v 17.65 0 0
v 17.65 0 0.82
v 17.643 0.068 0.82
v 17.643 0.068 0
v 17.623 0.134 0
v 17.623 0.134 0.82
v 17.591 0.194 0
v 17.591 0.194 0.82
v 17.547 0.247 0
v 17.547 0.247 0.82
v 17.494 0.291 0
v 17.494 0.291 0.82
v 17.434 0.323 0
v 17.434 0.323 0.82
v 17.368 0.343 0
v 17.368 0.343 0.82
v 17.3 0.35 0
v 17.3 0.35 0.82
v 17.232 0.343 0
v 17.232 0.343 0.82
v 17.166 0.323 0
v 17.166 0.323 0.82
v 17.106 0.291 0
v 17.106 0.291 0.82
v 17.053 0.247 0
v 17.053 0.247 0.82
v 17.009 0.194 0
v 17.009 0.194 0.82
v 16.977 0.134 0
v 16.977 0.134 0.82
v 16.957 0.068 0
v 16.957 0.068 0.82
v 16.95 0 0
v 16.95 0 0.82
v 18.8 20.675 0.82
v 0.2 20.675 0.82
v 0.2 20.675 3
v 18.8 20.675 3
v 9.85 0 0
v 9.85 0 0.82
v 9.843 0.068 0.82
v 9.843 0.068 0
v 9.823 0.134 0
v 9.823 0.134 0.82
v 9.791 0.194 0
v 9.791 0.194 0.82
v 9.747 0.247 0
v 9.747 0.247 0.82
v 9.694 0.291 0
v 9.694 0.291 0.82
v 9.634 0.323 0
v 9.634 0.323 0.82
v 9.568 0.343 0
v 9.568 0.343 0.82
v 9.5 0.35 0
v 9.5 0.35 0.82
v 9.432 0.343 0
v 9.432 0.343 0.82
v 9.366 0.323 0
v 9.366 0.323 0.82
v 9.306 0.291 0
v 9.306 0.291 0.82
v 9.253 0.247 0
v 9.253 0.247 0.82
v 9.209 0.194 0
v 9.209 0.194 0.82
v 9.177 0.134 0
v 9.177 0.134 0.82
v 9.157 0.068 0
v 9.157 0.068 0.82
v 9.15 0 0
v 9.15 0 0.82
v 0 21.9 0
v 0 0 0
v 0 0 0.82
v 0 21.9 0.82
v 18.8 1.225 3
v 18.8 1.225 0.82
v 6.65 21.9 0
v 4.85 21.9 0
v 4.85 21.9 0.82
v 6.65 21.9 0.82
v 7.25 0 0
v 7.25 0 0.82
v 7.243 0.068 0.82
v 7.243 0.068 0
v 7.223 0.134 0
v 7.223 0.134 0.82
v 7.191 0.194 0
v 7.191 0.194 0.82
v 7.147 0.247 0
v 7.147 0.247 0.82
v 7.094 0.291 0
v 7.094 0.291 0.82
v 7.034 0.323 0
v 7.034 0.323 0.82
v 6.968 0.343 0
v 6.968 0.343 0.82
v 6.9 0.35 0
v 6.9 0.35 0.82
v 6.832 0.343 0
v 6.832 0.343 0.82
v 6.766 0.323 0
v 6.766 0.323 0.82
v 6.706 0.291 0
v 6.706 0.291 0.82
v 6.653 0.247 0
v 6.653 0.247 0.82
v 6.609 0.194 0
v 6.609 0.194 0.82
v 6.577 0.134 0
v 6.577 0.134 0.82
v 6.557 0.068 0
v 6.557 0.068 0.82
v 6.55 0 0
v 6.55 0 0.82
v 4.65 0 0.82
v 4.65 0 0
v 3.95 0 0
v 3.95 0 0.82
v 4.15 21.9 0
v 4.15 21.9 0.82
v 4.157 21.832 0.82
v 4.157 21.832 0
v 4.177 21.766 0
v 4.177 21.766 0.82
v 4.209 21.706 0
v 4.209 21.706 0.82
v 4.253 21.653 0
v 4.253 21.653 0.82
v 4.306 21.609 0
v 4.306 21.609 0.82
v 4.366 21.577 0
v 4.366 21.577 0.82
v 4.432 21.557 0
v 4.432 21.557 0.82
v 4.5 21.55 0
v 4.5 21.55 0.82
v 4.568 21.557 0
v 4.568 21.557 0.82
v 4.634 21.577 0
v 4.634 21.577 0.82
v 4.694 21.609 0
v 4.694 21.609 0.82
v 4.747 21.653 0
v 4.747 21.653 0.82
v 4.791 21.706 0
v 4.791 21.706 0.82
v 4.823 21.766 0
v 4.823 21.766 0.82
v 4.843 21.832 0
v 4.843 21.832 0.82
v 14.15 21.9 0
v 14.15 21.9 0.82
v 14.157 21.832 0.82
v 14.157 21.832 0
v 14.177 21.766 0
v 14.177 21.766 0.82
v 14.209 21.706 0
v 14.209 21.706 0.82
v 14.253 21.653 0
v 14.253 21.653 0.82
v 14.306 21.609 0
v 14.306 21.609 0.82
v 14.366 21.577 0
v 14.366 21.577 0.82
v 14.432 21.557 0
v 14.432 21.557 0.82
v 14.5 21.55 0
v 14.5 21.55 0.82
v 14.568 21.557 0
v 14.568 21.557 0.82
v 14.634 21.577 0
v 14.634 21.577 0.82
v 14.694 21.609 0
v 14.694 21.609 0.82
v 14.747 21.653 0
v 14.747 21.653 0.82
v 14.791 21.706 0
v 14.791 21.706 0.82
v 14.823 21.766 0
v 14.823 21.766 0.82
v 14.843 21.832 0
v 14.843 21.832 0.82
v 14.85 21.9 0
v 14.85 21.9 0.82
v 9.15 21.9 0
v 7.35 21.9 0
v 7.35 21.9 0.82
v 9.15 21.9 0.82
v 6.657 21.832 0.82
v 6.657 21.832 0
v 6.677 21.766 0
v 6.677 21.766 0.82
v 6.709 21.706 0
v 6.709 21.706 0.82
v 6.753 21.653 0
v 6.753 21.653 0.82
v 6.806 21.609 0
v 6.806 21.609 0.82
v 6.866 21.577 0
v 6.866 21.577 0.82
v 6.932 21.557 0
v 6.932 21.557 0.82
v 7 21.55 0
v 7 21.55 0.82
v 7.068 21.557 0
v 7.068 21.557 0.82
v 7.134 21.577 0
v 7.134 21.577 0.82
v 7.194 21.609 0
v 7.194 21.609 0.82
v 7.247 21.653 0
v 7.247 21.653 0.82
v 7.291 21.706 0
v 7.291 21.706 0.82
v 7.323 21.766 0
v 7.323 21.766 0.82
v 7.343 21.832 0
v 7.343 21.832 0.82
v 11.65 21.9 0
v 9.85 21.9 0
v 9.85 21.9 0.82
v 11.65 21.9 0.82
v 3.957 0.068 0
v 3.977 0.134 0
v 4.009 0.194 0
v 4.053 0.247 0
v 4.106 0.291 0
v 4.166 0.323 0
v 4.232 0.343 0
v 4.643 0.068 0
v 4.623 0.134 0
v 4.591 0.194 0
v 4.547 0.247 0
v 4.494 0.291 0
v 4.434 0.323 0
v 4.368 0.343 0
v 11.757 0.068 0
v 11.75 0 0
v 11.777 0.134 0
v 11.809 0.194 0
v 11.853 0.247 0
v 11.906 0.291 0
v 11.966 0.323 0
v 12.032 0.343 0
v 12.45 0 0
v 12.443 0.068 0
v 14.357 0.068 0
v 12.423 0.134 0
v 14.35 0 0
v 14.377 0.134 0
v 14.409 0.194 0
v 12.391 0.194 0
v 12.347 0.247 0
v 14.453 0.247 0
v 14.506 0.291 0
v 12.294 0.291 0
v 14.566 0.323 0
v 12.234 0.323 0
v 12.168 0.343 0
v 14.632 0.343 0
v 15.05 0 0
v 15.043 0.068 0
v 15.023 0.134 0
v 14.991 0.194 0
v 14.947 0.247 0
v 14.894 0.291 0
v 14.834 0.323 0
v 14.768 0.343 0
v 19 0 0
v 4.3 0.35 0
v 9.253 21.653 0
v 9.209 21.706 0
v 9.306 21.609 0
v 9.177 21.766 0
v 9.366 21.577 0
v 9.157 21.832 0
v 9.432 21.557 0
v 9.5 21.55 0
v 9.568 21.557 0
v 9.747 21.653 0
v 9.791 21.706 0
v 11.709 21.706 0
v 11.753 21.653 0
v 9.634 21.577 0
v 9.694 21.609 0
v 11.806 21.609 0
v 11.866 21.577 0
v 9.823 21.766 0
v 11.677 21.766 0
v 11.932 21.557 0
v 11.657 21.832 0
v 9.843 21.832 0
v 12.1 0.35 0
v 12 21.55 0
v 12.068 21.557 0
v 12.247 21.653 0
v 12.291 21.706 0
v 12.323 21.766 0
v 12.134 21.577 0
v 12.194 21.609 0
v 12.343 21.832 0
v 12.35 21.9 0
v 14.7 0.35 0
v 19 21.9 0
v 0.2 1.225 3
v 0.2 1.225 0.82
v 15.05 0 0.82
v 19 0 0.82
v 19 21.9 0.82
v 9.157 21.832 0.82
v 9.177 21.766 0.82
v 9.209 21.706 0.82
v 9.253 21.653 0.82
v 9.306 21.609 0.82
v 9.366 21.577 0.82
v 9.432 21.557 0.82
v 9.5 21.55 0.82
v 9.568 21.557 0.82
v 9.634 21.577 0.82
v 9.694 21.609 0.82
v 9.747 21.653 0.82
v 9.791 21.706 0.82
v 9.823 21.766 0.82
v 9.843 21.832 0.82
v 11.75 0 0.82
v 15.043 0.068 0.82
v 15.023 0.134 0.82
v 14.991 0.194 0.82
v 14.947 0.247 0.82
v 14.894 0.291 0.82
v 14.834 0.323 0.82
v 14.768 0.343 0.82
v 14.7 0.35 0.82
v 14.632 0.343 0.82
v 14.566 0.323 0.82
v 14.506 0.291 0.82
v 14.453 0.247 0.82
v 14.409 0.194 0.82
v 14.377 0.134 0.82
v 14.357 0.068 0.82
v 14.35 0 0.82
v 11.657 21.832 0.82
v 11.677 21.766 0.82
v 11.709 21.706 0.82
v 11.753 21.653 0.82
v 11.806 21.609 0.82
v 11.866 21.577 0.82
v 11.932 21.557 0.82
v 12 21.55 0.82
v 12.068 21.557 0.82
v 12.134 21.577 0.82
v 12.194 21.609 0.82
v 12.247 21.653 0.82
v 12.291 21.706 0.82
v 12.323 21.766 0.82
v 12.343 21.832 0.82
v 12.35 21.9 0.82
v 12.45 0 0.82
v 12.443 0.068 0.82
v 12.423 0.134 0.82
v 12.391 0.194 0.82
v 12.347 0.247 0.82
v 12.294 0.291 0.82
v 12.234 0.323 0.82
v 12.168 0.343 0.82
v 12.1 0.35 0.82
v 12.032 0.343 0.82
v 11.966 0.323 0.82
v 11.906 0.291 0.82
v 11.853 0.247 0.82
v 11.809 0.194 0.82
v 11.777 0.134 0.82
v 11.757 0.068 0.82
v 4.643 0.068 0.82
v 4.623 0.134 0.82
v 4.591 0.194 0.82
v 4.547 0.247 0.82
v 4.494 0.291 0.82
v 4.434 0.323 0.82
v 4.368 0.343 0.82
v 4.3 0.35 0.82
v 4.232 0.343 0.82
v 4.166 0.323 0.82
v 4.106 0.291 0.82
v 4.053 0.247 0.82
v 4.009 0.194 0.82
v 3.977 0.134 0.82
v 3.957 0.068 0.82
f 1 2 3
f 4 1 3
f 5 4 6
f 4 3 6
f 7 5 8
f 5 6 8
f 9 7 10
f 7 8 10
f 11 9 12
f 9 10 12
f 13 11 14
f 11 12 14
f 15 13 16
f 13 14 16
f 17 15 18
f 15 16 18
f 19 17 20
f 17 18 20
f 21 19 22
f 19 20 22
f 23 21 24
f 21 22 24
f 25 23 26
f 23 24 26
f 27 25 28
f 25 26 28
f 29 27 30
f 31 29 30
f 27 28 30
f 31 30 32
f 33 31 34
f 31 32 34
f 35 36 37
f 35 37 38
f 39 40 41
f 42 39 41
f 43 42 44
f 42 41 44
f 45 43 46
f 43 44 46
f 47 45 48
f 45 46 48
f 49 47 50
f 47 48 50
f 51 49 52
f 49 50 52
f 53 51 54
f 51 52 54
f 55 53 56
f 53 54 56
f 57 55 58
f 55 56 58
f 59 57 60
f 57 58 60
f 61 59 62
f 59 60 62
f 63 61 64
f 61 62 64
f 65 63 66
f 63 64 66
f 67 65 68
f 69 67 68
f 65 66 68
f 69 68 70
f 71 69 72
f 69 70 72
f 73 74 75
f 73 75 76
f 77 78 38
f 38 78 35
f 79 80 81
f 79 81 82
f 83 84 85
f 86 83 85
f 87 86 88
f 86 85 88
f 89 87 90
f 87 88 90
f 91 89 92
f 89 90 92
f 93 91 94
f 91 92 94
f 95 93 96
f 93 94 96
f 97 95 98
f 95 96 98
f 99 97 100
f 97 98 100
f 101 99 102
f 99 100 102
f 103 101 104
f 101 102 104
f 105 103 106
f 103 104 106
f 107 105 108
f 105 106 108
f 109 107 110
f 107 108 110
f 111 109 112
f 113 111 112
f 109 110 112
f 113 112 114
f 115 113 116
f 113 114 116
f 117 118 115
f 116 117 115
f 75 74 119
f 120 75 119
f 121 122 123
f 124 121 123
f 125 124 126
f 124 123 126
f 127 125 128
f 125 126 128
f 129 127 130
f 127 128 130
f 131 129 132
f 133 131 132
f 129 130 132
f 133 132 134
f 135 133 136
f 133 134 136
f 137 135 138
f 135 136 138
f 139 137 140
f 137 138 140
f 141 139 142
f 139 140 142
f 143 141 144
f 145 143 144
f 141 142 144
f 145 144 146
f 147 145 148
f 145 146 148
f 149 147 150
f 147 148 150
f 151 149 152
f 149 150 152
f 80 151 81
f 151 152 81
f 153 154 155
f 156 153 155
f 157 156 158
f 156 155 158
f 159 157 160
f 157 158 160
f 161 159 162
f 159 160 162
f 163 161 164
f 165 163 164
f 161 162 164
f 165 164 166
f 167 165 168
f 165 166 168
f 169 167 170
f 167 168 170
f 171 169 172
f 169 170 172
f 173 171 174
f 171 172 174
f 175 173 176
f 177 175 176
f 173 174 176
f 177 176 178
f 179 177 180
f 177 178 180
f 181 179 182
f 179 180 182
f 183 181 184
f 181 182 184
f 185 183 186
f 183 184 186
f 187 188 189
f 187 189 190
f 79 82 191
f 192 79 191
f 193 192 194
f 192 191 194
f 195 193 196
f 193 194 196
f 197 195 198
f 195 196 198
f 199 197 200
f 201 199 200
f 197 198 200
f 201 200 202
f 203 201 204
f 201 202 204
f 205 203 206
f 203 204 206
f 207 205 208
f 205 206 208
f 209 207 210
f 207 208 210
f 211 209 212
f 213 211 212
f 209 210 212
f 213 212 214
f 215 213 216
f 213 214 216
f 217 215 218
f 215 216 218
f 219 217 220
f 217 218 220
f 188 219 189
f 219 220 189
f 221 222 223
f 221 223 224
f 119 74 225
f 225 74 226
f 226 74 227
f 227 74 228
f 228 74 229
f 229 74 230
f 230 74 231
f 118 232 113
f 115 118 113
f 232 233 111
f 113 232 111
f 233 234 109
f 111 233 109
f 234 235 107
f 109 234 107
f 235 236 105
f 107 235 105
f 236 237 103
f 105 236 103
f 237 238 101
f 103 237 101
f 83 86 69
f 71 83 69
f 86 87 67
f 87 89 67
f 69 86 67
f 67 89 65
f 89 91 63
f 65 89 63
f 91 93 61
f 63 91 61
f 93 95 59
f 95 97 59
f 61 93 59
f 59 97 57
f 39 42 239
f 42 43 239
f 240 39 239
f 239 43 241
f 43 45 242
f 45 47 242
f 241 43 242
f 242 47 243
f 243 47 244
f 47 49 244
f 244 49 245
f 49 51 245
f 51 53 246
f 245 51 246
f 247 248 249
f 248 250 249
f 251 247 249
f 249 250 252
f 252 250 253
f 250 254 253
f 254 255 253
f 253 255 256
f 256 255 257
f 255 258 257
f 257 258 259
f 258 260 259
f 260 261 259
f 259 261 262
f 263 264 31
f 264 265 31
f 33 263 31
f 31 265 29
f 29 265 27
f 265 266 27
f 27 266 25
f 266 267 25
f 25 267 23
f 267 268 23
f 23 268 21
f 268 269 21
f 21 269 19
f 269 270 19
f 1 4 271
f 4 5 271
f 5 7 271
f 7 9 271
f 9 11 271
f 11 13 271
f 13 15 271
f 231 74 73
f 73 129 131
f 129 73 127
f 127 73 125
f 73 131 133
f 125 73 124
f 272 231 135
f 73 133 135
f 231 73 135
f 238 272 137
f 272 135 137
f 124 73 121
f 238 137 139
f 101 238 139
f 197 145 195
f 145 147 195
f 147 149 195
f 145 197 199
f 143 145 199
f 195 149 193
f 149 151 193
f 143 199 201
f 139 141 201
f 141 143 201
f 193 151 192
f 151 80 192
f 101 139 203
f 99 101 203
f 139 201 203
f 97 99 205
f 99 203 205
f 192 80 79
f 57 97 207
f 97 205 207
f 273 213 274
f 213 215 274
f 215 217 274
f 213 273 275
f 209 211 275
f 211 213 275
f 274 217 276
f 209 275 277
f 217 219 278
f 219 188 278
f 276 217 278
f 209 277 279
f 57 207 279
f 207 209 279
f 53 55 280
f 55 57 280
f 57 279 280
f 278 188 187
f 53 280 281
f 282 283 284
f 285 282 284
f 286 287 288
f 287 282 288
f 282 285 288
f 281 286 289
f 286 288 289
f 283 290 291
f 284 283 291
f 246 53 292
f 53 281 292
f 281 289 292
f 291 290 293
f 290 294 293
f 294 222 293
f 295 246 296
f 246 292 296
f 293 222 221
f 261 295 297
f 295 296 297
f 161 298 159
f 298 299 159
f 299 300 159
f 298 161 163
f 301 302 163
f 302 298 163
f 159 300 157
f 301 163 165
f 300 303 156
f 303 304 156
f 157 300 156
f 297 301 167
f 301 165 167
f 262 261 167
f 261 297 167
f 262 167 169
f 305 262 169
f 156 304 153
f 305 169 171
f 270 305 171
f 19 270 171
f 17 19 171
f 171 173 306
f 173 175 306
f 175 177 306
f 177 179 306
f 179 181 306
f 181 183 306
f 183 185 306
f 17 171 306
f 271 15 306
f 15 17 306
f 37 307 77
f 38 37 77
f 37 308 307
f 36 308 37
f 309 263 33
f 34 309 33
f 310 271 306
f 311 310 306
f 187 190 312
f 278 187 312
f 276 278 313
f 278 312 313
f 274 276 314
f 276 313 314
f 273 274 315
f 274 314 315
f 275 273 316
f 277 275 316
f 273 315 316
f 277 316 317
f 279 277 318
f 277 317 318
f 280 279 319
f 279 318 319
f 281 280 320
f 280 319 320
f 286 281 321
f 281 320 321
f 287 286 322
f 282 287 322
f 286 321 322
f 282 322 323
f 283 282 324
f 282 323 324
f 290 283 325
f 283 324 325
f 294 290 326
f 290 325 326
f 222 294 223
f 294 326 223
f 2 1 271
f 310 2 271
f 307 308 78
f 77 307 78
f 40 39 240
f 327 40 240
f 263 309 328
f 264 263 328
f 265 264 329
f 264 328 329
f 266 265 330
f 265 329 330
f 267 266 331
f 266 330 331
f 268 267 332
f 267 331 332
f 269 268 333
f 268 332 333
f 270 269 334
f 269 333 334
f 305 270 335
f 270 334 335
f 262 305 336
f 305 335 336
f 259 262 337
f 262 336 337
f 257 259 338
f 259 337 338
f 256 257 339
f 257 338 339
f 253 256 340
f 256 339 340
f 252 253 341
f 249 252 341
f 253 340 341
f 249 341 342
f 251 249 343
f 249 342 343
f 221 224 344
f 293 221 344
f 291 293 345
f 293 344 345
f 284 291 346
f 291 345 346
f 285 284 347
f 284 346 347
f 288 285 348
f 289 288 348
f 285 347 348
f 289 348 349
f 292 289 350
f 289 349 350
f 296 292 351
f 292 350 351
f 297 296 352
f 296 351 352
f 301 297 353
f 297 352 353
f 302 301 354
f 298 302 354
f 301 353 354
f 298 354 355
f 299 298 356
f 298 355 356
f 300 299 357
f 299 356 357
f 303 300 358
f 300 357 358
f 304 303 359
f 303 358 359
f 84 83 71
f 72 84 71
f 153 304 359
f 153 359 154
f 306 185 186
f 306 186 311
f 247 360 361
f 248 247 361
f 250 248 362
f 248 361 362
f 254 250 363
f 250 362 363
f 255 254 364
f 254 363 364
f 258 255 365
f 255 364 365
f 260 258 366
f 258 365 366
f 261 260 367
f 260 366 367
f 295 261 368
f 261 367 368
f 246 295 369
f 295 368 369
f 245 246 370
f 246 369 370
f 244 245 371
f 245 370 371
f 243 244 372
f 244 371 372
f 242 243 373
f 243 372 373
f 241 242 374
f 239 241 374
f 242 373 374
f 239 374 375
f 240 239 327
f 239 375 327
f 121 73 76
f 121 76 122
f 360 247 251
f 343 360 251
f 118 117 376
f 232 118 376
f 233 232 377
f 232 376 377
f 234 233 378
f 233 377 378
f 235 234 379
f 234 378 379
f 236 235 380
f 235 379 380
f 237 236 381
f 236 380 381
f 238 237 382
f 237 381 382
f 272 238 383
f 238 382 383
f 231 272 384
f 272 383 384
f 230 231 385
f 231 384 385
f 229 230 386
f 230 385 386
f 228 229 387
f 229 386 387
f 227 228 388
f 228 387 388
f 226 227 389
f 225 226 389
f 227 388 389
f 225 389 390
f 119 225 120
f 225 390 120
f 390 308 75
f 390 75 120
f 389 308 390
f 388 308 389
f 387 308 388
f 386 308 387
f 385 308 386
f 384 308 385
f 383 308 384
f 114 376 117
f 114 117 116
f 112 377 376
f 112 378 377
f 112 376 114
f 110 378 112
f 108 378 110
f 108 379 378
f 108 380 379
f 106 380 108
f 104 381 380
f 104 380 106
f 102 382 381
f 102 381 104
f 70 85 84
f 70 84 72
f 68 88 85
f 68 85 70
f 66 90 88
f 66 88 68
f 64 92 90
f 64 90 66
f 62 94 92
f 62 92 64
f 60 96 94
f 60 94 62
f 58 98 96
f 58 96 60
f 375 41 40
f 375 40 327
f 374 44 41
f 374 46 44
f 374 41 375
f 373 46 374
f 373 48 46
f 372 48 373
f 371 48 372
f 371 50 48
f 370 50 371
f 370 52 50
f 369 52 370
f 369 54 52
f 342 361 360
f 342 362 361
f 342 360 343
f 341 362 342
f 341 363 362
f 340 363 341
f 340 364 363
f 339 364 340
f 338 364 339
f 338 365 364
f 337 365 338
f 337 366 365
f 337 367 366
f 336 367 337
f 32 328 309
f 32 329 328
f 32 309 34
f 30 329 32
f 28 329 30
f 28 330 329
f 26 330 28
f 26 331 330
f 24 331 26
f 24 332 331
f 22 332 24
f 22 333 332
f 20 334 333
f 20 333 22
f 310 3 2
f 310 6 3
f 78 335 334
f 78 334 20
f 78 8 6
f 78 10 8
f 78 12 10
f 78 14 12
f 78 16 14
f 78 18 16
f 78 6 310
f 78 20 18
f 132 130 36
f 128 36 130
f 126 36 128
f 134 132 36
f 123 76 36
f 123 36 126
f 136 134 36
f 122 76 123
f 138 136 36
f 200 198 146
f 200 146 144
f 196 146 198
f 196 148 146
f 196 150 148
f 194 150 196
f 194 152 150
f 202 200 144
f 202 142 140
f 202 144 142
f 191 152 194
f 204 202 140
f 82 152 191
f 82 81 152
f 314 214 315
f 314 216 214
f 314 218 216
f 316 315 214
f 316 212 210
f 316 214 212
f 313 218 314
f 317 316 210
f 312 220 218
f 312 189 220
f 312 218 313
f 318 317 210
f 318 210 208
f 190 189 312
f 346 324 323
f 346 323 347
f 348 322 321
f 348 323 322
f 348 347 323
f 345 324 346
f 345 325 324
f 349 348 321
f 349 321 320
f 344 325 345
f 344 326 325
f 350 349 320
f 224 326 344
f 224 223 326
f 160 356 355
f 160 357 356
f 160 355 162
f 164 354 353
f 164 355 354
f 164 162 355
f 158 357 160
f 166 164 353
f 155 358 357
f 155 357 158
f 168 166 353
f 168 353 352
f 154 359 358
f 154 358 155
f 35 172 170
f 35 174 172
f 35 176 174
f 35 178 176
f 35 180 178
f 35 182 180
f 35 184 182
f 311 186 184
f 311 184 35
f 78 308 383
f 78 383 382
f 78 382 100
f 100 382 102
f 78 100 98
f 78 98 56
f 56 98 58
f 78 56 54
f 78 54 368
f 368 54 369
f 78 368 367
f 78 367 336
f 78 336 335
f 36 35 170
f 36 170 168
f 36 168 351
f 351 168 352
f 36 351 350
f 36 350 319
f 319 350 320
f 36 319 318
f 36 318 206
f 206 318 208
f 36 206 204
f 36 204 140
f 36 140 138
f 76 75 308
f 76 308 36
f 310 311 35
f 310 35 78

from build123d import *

# Parameters (mm, degrees)
SKETCH1_W           = 19
SKETCH1_H           = 21.9
BOSS_EXTRUDE1_DEPTH = 0.82
SKETCH2_W           = 18.6
SKETCH2_H           = 19.45
BOSS_EXTRUDE2_DEPTH = 2.18
SKETCH3_R           = 0.35
CUT_EXTRUDE1_DEPTH  = 30.075116509


with BuildPart() as part:
    # Sketch1 → Boss-Extrude1 (new body)
    with BuildSketch(Plane.XY):
        with Locations((9.5, 10.95)):
            Rectangle(SKETCH1_W, SKETCH1_H)
    extrude(amount=BOSS_EXTRUDE1_DEPTH)

    # Sketch2 → Boss-Extrude2 (add)
    with BuildSketch(Plane.XY.offset(0.82)):
        with Locations((9.5, 10.95)):
            Rectangle(SKETCH2_W, SKETCH2_H)
    extrude(amount=BOSS_EXTRUDE2_DEPTH)

    # Sketch3 → Cut-Extrude1 (cut, through all)
    with BuildSketch(Plane.XY.offset(0.82)):
        with Locations((4.5, 21.9)):
            Circle(SKETCH3_R)
        with Locations((7, 21.9)):
            Circle(SKETCH3_R)
        with Locations((9.5, 21.9)):
            Circle(SKETCH3_R)
        with Locations((12, 21.9)):
            Circle(SKETCH3_R)
        with Locations((14.5, 21.9)):
            Circle(SKETCH3_R)
        with Locations((4.3, 0)):
            Circle(SKETCH3_R)
        with Locations((6.9, 0)):
            Circle(SKETCH3_R)
        with Locations((9.5, 0)):
            Circle(SKETCH3_R)
        with Locations((12.1, 0)):
            Circle(SKETCH3_R)
        with Locations((14.7, 0)):
            Circle(SKETCH3_R)
        with Locations((17.3, 0)):
            Circle(SKETCH3_R)
    extrude(amount=-CUT_EXTRUDE1_DEPTH, mode=Mode.SUBTRACT)


solid = part.part
